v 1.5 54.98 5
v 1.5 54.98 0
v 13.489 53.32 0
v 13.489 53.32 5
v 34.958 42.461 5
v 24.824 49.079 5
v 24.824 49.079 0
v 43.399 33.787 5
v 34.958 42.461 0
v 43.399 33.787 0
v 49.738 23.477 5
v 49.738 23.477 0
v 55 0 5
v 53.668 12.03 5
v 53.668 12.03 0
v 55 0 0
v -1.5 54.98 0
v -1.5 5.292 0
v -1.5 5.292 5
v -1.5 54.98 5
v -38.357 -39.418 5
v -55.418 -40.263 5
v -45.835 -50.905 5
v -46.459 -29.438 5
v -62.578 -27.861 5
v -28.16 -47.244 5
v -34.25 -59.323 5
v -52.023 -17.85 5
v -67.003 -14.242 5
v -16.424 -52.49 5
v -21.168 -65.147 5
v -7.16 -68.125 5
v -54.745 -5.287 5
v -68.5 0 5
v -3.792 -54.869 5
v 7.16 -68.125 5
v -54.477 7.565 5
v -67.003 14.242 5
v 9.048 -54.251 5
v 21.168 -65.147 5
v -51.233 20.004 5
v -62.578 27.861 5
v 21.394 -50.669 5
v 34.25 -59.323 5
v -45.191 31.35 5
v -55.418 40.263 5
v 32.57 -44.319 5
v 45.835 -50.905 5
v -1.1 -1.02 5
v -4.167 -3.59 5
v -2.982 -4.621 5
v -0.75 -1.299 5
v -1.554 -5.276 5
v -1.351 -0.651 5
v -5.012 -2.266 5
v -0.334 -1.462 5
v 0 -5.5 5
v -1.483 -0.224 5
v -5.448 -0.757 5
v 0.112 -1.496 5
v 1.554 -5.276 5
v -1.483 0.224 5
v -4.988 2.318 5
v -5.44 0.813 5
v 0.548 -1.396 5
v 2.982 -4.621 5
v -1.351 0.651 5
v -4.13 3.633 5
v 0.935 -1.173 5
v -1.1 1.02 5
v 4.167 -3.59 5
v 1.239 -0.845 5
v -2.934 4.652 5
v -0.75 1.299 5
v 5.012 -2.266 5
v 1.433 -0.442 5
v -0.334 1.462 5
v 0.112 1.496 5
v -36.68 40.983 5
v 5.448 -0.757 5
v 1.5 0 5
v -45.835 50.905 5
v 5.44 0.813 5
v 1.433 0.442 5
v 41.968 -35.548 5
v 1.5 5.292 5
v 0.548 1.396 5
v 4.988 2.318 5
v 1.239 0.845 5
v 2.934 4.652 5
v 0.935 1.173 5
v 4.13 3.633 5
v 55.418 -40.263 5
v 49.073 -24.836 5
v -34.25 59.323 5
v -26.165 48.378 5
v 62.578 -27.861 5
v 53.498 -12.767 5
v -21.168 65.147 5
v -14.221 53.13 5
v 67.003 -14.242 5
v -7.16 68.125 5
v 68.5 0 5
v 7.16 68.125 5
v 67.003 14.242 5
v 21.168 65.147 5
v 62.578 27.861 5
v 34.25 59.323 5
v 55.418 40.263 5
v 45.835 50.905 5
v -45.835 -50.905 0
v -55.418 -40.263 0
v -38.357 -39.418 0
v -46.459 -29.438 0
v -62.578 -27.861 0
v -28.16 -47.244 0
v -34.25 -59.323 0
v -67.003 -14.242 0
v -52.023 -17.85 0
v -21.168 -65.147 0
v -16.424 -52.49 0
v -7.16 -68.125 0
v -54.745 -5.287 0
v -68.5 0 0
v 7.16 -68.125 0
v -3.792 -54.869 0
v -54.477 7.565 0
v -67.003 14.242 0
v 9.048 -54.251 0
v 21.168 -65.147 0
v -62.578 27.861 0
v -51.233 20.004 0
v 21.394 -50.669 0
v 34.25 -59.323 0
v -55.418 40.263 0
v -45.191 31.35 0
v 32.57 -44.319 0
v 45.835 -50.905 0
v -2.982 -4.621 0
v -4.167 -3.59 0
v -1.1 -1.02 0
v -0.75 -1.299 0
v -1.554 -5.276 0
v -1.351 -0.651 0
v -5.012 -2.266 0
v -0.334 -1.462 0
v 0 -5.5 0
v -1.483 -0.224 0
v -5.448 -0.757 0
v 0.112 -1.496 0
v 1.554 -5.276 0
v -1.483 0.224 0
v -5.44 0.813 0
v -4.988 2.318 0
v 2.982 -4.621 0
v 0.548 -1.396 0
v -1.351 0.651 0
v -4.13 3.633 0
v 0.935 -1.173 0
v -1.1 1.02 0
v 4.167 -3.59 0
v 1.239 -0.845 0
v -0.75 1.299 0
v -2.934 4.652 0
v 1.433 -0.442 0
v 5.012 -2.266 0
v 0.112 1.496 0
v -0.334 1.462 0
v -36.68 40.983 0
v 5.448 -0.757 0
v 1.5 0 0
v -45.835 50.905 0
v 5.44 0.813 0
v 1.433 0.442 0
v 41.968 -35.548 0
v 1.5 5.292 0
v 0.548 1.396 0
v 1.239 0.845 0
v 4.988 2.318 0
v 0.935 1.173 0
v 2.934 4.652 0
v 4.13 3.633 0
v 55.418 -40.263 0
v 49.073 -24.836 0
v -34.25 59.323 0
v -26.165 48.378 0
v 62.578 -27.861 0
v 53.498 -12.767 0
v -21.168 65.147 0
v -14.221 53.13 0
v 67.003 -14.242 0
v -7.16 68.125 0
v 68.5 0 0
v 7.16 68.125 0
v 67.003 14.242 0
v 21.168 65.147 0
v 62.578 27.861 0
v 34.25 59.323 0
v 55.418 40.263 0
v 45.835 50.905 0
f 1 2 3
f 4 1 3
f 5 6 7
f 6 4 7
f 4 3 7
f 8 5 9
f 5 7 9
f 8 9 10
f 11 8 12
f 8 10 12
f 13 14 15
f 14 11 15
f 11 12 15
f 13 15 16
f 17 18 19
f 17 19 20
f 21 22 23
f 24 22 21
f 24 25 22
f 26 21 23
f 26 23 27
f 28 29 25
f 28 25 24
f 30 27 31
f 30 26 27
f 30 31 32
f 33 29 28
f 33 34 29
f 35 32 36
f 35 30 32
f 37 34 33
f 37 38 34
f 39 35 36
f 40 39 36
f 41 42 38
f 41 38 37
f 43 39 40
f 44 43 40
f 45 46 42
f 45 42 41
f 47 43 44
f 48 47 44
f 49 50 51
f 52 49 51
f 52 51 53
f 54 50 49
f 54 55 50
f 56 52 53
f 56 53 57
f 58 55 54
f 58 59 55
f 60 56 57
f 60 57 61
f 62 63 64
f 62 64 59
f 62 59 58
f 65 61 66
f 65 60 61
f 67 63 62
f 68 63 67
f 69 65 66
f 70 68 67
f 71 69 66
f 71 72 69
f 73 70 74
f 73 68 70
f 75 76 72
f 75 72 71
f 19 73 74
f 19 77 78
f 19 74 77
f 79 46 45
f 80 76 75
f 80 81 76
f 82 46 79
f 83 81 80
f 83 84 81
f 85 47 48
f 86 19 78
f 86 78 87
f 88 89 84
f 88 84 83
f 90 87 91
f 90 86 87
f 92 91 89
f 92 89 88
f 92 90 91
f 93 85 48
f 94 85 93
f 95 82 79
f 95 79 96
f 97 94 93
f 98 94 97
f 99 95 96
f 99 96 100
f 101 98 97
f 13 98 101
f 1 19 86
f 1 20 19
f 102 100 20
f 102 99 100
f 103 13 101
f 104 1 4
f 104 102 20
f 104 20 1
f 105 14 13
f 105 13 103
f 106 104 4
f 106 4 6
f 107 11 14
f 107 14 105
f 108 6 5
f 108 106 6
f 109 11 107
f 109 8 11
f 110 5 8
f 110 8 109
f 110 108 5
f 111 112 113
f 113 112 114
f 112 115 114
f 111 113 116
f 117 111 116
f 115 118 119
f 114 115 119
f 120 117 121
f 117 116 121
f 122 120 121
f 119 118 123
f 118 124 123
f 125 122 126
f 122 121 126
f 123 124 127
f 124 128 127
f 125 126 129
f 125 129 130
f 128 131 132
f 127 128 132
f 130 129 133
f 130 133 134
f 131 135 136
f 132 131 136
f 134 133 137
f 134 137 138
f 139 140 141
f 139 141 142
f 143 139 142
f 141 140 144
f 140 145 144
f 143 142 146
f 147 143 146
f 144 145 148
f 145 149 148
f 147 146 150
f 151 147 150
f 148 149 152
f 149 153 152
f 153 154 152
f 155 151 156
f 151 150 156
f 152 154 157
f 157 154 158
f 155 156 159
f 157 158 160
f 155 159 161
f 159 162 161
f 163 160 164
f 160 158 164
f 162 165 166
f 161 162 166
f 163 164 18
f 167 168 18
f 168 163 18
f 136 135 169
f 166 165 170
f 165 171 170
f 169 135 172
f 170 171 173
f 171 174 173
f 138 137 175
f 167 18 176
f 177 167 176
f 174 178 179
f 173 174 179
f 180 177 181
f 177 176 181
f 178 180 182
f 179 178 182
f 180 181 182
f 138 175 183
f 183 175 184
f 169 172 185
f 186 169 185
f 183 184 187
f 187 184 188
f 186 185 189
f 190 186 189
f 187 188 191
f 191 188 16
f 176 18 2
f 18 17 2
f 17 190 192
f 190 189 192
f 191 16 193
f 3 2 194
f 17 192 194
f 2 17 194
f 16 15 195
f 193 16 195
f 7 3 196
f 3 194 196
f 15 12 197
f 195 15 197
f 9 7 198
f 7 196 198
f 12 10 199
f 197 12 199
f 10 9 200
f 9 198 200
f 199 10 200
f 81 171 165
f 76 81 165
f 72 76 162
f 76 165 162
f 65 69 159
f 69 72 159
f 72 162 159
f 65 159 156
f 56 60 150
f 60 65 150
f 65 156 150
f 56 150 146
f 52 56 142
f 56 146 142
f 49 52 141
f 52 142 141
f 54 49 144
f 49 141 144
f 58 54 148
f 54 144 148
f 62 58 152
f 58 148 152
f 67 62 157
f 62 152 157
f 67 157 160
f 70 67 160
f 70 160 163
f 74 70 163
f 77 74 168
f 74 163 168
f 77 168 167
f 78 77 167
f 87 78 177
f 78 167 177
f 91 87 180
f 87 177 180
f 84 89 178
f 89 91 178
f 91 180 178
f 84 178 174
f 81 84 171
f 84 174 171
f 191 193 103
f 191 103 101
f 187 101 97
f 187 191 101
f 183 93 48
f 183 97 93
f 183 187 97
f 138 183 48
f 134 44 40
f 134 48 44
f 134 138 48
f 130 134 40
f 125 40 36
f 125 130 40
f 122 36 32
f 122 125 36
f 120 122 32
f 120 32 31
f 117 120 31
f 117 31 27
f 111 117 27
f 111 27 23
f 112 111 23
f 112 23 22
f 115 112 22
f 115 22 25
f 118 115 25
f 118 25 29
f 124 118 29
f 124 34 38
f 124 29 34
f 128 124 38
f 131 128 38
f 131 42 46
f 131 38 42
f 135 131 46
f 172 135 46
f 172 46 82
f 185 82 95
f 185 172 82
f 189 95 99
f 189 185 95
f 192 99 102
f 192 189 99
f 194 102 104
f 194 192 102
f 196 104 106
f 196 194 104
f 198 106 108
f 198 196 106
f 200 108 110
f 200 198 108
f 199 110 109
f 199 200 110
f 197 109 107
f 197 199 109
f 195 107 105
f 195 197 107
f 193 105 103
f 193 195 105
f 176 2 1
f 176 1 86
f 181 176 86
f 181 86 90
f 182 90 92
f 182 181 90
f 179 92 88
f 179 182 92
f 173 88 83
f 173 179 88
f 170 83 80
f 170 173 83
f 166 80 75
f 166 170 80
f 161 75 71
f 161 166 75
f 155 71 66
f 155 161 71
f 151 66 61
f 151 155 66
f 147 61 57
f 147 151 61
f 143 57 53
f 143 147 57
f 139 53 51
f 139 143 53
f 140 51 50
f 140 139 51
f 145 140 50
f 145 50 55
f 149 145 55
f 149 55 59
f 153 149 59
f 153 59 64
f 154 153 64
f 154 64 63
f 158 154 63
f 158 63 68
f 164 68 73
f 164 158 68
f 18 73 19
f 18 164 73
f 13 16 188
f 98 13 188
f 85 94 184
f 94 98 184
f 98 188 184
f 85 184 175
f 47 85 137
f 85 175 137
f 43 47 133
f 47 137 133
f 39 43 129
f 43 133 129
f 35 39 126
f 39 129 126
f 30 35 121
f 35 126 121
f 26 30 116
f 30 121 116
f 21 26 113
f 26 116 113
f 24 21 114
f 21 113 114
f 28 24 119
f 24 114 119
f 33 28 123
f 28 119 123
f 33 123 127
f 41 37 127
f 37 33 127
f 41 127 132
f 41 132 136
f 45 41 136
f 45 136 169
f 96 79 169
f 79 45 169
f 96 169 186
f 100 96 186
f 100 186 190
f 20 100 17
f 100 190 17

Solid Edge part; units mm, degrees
sketch "Sketch1" plane through (0, 0, 0) normal (0, 0, 1) x (1, 0, 0)
  line L0 (1.5, 54.9795) -> (1.5, 5.2915)
  arc A0 (1.5, 5.2915) -> (-1.5, 5.2915) centre (0, 0) ccw
  line L1 (-1.5, 5.2915) -> (-1.5, 54.9795)
  arc A1 (1.5, 54.9795) -> (-1.5, 54.9795) centre (0, 0) ccw
extrude "Protrusion1" add sketch "Sketch1" along normal blind 5
sketch "Sketch2" plane through (0, 0, 0) normal (0, 0, 1) x (1, 0, 0)
  circle A0 centre (0, 0) radius 5.5
  circle A1 centre (0, 0) radius 1.5
  circle A2 centre (0, 0) radius 55
  circle A3 centre (0, 0) radius 68.5
extrude "ExtrudedProtrusion_4" add sketch "Sketch2" along normal blind 5
